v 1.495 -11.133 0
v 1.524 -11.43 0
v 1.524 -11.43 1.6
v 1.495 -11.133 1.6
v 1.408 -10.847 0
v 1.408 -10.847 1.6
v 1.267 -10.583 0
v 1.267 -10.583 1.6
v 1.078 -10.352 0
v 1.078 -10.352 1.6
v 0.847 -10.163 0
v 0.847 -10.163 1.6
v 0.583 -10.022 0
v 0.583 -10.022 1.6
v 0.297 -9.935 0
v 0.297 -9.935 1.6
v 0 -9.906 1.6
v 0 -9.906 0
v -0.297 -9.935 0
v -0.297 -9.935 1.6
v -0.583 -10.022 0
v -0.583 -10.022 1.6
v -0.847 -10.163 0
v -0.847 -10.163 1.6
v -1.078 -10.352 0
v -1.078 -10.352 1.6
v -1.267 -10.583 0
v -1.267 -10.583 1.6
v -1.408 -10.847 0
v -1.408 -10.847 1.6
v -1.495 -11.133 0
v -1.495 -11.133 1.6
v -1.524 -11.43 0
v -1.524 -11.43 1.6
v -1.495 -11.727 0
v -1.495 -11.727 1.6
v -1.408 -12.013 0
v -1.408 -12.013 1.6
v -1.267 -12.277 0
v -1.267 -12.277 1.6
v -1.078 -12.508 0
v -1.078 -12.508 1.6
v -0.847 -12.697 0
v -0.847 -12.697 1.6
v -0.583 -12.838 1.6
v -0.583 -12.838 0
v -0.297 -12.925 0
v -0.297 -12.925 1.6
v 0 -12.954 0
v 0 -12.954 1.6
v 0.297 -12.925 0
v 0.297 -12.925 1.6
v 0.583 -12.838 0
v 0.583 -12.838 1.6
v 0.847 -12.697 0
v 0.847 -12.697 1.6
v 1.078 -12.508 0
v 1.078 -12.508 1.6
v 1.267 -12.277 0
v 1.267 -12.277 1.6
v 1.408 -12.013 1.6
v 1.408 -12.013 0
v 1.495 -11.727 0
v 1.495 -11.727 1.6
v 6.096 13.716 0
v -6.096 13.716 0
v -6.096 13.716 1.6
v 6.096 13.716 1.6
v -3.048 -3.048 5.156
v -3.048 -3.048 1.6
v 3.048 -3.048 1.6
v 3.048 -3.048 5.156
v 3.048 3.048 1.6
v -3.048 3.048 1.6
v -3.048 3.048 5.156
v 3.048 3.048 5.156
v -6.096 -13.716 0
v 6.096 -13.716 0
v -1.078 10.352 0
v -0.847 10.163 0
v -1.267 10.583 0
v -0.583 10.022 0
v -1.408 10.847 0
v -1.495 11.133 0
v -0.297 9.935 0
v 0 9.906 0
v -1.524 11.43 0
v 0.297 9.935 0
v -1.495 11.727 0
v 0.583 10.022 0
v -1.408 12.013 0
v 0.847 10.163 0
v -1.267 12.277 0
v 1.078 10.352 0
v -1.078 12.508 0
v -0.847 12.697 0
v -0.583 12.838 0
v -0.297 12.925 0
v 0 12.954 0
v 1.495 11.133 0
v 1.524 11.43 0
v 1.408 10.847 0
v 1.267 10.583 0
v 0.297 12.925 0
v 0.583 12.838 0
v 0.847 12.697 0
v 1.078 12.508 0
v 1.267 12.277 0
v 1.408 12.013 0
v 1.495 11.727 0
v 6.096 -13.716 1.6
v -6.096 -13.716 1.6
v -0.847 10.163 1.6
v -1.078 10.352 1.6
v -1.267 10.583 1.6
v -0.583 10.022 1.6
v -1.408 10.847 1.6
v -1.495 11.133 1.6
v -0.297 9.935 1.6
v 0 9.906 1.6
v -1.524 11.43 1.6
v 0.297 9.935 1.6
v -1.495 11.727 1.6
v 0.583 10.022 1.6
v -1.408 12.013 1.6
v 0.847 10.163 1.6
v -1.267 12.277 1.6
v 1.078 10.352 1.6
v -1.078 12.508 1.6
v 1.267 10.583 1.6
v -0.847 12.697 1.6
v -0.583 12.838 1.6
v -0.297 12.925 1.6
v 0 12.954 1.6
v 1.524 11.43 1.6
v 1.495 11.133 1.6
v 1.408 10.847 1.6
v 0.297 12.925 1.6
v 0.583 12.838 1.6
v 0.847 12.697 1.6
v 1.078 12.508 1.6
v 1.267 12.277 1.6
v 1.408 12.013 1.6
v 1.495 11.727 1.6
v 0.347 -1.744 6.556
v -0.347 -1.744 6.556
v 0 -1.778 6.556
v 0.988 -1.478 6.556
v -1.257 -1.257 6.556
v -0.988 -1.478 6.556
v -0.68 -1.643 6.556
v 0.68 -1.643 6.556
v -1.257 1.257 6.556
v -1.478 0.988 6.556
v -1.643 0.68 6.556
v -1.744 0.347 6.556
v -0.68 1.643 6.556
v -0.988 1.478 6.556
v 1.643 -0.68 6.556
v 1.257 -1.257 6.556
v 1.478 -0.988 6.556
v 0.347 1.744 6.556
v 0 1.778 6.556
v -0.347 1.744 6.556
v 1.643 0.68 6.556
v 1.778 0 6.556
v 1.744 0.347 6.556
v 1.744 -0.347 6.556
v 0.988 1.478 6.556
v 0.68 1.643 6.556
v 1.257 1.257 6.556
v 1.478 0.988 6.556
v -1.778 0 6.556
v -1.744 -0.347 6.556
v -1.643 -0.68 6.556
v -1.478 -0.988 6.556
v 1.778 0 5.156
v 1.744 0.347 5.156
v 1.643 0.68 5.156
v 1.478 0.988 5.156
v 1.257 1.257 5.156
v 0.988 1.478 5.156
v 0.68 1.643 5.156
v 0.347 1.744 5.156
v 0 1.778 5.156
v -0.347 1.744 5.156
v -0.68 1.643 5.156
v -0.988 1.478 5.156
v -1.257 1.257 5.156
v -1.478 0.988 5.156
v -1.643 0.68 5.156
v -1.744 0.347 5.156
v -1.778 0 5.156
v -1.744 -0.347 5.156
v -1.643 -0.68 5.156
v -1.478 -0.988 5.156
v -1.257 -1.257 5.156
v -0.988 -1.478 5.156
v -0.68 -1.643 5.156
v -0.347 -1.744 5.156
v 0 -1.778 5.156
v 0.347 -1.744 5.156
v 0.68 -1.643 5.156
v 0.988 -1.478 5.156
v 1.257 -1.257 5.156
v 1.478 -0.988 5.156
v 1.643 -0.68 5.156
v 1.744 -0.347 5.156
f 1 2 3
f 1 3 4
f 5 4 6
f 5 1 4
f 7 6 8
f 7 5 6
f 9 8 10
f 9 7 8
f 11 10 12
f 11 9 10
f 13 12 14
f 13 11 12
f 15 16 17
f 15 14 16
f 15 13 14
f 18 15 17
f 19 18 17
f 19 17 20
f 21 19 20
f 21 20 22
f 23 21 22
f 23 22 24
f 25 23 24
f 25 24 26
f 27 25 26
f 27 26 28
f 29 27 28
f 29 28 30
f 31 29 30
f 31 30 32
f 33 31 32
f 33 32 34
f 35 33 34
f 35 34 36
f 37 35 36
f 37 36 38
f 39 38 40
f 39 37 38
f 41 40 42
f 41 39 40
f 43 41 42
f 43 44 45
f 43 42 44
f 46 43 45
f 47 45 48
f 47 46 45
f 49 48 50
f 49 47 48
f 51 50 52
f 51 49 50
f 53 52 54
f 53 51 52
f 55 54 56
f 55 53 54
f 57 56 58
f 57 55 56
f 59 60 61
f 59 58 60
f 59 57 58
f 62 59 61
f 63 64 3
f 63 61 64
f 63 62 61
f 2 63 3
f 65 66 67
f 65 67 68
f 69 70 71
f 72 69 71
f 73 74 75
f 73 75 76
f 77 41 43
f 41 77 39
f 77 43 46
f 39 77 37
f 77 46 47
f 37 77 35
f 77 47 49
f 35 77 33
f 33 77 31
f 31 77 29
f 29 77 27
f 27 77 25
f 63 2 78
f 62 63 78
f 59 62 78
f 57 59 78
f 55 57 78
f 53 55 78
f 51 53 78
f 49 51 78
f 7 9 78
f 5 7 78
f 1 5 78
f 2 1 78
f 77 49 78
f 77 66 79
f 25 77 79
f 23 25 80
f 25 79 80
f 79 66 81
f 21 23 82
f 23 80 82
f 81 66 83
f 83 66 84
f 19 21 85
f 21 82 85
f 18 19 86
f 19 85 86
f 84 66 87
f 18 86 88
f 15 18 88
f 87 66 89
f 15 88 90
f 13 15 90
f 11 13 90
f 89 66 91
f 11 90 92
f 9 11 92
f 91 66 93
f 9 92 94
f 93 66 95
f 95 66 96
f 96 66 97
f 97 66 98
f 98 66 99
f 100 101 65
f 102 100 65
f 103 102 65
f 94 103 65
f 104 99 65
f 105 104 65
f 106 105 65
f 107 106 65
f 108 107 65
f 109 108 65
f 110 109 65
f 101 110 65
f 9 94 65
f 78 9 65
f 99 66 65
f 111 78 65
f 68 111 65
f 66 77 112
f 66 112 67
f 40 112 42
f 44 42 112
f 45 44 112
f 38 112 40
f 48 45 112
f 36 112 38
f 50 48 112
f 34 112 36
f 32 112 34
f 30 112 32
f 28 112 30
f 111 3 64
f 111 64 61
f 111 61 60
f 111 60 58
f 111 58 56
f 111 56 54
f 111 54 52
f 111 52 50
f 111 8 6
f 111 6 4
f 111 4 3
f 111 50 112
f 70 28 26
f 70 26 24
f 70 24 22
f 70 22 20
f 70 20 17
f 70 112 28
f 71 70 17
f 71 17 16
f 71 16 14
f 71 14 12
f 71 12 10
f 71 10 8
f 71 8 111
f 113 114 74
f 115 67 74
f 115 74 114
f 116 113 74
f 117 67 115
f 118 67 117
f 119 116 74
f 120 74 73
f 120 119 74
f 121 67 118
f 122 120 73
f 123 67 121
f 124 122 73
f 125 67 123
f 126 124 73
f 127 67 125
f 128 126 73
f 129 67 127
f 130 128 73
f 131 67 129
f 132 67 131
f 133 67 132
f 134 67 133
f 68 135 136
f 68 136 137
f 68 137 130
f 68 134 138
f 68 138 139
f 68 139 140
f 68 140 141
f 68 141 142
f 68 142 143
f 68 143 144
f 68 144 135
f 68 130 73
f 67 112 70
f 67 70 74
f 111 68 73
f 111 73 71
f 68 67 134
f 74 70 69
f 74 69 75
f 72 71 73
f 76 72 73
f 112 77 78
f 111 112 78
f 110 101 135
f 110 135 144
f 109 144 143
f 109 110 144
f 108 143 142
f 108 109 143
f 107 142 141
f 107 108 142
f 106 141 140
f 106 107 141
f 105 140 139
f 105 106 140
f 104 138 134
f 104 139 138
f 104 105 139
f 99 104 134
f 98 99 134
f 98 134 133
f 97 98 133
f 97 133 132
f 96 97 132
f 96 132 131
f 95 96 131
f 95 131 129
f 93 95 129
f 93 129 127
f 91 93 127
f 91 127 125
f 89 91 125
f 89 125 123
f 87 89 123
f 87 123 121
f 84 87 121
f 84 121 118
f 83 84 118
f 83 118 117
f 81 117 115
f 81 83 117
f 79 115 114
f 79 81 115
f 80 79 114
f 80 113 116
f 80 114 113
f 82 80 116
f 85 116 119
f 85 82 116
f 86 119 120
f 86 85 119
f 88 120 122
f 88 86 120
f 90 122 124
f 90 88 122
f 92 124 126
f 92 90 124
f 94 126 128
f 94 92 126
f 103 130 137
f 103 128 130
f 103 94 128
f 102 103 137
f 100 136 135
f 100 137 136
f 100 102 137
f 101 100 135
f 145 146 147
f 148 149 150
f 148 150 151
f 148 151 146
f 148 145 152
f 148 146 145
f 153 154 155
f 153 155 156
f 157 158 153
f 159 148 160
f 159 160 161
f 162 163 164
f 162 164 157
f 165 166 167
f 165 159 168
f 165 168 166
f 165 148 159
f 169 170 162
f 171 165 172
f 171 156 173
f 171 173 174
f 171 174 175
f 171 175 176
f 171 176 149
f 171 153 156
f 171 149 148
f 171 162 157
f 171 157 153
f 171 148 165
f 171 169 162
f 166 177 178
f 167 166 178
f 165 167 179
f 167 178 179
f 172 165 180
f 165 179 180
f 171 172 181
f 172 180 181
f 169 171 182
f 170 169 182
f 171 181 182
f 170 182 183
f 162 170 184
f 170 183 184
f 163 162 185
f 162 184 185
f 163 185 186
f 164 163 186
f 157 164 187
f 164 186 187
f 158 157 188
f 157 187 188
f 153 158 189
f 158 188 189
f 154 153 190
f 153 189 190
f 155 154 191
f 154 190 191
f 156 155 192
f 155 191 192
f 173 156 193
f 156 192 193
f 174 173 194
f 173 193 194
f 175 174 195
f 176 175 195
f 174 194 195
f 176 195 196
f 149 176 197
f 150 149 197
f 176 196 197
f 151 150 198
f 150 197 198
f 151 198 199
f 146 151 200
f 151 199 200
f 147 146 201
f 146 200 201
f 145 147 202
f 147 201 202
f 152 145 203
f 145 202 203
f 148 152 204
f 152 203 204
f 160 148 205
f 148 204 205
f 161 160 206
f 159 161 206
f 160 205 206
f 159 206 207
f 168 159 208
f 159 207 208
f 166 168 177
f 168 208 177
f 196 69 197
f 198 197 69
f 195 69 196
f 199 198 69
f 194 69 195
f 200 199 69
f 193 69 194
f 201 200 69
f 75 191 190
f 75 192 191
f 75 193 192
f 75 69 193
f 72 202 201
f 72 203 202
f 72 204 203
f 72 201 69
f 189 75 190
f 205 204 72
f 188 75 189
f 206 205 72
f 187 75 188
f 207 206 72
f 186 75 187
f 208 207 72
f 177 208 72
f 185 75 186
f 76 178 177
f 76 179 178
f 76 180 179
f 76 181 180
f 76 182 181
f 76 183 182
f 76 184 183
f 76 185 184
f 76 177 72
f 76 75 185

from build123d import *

# Parameters (mm, degrees)
SKETCH1_W               = 12.192
SKETCH1_H               = 27.432
BOSS_EXTRUDE1_DEPTH     = 1.6002
SKETCH2_W               = 6.096
SKETCH2_H               = 6.096
BOSS_EXTRUDE2_DEPTH     = 3.556
CUT_EXTRUDE1_DEPTH      = 16.425142074
CUT_EXTRUDE1_DEPTH_BACK = 16.425142074
SKETCH4_R               = 1.524
SKETCH5_R               = 1.778
BOSS_EXTRUDE3_DEPTH     = 1.39954


with BuildPart() as part:
    # Sketch1 → Boss-Extrude1 (new body)
    with BuildSketch(Plane.XY):
        Rectangle(SKETCH1_W, SKETCH1_H)
    extrude(amount=BOSS_EXTRUDE1_DEPTH)

    # Sketch2 → Boss-Extrude2 (add)
    with BuildSketch(Plane.XY.offset(1.6002)):
        Rectangle(SKETCH2_W, SKETCH2_H)
    extrude(amount=BOSS_EXTRUDE2_DEPTH)

    # Sketch4 → Cut-Extrude1 (cut, two sides: drawn at the far end of the back side and taken through both)
    with BuildSketch(Plane.XY.offset(1.6002).offset(-CUT_EXTRUDE1_DEPTH_BACK)):
        with Locations((0, 11.43)):
            Circle(SKETCH4_R)
        with Locations((0, -11.43)):
            Circle(SKETCH4_R)
    extrude(amount=CUT_EXTRUDE1_DEPTH + CUT_EXTRUDE1_DEPTH_BACK, mode=Mode.SUBTRACT)

    # Sketch5 → Boss-Extrude3 (add)
    with BuildSketch(Plane.XY.offset(5.1562)):
        Circle(SKETCH5_R)
    extrude(amount=BOSS_EXTRUDE3_DEPTH)


solid = part.part
